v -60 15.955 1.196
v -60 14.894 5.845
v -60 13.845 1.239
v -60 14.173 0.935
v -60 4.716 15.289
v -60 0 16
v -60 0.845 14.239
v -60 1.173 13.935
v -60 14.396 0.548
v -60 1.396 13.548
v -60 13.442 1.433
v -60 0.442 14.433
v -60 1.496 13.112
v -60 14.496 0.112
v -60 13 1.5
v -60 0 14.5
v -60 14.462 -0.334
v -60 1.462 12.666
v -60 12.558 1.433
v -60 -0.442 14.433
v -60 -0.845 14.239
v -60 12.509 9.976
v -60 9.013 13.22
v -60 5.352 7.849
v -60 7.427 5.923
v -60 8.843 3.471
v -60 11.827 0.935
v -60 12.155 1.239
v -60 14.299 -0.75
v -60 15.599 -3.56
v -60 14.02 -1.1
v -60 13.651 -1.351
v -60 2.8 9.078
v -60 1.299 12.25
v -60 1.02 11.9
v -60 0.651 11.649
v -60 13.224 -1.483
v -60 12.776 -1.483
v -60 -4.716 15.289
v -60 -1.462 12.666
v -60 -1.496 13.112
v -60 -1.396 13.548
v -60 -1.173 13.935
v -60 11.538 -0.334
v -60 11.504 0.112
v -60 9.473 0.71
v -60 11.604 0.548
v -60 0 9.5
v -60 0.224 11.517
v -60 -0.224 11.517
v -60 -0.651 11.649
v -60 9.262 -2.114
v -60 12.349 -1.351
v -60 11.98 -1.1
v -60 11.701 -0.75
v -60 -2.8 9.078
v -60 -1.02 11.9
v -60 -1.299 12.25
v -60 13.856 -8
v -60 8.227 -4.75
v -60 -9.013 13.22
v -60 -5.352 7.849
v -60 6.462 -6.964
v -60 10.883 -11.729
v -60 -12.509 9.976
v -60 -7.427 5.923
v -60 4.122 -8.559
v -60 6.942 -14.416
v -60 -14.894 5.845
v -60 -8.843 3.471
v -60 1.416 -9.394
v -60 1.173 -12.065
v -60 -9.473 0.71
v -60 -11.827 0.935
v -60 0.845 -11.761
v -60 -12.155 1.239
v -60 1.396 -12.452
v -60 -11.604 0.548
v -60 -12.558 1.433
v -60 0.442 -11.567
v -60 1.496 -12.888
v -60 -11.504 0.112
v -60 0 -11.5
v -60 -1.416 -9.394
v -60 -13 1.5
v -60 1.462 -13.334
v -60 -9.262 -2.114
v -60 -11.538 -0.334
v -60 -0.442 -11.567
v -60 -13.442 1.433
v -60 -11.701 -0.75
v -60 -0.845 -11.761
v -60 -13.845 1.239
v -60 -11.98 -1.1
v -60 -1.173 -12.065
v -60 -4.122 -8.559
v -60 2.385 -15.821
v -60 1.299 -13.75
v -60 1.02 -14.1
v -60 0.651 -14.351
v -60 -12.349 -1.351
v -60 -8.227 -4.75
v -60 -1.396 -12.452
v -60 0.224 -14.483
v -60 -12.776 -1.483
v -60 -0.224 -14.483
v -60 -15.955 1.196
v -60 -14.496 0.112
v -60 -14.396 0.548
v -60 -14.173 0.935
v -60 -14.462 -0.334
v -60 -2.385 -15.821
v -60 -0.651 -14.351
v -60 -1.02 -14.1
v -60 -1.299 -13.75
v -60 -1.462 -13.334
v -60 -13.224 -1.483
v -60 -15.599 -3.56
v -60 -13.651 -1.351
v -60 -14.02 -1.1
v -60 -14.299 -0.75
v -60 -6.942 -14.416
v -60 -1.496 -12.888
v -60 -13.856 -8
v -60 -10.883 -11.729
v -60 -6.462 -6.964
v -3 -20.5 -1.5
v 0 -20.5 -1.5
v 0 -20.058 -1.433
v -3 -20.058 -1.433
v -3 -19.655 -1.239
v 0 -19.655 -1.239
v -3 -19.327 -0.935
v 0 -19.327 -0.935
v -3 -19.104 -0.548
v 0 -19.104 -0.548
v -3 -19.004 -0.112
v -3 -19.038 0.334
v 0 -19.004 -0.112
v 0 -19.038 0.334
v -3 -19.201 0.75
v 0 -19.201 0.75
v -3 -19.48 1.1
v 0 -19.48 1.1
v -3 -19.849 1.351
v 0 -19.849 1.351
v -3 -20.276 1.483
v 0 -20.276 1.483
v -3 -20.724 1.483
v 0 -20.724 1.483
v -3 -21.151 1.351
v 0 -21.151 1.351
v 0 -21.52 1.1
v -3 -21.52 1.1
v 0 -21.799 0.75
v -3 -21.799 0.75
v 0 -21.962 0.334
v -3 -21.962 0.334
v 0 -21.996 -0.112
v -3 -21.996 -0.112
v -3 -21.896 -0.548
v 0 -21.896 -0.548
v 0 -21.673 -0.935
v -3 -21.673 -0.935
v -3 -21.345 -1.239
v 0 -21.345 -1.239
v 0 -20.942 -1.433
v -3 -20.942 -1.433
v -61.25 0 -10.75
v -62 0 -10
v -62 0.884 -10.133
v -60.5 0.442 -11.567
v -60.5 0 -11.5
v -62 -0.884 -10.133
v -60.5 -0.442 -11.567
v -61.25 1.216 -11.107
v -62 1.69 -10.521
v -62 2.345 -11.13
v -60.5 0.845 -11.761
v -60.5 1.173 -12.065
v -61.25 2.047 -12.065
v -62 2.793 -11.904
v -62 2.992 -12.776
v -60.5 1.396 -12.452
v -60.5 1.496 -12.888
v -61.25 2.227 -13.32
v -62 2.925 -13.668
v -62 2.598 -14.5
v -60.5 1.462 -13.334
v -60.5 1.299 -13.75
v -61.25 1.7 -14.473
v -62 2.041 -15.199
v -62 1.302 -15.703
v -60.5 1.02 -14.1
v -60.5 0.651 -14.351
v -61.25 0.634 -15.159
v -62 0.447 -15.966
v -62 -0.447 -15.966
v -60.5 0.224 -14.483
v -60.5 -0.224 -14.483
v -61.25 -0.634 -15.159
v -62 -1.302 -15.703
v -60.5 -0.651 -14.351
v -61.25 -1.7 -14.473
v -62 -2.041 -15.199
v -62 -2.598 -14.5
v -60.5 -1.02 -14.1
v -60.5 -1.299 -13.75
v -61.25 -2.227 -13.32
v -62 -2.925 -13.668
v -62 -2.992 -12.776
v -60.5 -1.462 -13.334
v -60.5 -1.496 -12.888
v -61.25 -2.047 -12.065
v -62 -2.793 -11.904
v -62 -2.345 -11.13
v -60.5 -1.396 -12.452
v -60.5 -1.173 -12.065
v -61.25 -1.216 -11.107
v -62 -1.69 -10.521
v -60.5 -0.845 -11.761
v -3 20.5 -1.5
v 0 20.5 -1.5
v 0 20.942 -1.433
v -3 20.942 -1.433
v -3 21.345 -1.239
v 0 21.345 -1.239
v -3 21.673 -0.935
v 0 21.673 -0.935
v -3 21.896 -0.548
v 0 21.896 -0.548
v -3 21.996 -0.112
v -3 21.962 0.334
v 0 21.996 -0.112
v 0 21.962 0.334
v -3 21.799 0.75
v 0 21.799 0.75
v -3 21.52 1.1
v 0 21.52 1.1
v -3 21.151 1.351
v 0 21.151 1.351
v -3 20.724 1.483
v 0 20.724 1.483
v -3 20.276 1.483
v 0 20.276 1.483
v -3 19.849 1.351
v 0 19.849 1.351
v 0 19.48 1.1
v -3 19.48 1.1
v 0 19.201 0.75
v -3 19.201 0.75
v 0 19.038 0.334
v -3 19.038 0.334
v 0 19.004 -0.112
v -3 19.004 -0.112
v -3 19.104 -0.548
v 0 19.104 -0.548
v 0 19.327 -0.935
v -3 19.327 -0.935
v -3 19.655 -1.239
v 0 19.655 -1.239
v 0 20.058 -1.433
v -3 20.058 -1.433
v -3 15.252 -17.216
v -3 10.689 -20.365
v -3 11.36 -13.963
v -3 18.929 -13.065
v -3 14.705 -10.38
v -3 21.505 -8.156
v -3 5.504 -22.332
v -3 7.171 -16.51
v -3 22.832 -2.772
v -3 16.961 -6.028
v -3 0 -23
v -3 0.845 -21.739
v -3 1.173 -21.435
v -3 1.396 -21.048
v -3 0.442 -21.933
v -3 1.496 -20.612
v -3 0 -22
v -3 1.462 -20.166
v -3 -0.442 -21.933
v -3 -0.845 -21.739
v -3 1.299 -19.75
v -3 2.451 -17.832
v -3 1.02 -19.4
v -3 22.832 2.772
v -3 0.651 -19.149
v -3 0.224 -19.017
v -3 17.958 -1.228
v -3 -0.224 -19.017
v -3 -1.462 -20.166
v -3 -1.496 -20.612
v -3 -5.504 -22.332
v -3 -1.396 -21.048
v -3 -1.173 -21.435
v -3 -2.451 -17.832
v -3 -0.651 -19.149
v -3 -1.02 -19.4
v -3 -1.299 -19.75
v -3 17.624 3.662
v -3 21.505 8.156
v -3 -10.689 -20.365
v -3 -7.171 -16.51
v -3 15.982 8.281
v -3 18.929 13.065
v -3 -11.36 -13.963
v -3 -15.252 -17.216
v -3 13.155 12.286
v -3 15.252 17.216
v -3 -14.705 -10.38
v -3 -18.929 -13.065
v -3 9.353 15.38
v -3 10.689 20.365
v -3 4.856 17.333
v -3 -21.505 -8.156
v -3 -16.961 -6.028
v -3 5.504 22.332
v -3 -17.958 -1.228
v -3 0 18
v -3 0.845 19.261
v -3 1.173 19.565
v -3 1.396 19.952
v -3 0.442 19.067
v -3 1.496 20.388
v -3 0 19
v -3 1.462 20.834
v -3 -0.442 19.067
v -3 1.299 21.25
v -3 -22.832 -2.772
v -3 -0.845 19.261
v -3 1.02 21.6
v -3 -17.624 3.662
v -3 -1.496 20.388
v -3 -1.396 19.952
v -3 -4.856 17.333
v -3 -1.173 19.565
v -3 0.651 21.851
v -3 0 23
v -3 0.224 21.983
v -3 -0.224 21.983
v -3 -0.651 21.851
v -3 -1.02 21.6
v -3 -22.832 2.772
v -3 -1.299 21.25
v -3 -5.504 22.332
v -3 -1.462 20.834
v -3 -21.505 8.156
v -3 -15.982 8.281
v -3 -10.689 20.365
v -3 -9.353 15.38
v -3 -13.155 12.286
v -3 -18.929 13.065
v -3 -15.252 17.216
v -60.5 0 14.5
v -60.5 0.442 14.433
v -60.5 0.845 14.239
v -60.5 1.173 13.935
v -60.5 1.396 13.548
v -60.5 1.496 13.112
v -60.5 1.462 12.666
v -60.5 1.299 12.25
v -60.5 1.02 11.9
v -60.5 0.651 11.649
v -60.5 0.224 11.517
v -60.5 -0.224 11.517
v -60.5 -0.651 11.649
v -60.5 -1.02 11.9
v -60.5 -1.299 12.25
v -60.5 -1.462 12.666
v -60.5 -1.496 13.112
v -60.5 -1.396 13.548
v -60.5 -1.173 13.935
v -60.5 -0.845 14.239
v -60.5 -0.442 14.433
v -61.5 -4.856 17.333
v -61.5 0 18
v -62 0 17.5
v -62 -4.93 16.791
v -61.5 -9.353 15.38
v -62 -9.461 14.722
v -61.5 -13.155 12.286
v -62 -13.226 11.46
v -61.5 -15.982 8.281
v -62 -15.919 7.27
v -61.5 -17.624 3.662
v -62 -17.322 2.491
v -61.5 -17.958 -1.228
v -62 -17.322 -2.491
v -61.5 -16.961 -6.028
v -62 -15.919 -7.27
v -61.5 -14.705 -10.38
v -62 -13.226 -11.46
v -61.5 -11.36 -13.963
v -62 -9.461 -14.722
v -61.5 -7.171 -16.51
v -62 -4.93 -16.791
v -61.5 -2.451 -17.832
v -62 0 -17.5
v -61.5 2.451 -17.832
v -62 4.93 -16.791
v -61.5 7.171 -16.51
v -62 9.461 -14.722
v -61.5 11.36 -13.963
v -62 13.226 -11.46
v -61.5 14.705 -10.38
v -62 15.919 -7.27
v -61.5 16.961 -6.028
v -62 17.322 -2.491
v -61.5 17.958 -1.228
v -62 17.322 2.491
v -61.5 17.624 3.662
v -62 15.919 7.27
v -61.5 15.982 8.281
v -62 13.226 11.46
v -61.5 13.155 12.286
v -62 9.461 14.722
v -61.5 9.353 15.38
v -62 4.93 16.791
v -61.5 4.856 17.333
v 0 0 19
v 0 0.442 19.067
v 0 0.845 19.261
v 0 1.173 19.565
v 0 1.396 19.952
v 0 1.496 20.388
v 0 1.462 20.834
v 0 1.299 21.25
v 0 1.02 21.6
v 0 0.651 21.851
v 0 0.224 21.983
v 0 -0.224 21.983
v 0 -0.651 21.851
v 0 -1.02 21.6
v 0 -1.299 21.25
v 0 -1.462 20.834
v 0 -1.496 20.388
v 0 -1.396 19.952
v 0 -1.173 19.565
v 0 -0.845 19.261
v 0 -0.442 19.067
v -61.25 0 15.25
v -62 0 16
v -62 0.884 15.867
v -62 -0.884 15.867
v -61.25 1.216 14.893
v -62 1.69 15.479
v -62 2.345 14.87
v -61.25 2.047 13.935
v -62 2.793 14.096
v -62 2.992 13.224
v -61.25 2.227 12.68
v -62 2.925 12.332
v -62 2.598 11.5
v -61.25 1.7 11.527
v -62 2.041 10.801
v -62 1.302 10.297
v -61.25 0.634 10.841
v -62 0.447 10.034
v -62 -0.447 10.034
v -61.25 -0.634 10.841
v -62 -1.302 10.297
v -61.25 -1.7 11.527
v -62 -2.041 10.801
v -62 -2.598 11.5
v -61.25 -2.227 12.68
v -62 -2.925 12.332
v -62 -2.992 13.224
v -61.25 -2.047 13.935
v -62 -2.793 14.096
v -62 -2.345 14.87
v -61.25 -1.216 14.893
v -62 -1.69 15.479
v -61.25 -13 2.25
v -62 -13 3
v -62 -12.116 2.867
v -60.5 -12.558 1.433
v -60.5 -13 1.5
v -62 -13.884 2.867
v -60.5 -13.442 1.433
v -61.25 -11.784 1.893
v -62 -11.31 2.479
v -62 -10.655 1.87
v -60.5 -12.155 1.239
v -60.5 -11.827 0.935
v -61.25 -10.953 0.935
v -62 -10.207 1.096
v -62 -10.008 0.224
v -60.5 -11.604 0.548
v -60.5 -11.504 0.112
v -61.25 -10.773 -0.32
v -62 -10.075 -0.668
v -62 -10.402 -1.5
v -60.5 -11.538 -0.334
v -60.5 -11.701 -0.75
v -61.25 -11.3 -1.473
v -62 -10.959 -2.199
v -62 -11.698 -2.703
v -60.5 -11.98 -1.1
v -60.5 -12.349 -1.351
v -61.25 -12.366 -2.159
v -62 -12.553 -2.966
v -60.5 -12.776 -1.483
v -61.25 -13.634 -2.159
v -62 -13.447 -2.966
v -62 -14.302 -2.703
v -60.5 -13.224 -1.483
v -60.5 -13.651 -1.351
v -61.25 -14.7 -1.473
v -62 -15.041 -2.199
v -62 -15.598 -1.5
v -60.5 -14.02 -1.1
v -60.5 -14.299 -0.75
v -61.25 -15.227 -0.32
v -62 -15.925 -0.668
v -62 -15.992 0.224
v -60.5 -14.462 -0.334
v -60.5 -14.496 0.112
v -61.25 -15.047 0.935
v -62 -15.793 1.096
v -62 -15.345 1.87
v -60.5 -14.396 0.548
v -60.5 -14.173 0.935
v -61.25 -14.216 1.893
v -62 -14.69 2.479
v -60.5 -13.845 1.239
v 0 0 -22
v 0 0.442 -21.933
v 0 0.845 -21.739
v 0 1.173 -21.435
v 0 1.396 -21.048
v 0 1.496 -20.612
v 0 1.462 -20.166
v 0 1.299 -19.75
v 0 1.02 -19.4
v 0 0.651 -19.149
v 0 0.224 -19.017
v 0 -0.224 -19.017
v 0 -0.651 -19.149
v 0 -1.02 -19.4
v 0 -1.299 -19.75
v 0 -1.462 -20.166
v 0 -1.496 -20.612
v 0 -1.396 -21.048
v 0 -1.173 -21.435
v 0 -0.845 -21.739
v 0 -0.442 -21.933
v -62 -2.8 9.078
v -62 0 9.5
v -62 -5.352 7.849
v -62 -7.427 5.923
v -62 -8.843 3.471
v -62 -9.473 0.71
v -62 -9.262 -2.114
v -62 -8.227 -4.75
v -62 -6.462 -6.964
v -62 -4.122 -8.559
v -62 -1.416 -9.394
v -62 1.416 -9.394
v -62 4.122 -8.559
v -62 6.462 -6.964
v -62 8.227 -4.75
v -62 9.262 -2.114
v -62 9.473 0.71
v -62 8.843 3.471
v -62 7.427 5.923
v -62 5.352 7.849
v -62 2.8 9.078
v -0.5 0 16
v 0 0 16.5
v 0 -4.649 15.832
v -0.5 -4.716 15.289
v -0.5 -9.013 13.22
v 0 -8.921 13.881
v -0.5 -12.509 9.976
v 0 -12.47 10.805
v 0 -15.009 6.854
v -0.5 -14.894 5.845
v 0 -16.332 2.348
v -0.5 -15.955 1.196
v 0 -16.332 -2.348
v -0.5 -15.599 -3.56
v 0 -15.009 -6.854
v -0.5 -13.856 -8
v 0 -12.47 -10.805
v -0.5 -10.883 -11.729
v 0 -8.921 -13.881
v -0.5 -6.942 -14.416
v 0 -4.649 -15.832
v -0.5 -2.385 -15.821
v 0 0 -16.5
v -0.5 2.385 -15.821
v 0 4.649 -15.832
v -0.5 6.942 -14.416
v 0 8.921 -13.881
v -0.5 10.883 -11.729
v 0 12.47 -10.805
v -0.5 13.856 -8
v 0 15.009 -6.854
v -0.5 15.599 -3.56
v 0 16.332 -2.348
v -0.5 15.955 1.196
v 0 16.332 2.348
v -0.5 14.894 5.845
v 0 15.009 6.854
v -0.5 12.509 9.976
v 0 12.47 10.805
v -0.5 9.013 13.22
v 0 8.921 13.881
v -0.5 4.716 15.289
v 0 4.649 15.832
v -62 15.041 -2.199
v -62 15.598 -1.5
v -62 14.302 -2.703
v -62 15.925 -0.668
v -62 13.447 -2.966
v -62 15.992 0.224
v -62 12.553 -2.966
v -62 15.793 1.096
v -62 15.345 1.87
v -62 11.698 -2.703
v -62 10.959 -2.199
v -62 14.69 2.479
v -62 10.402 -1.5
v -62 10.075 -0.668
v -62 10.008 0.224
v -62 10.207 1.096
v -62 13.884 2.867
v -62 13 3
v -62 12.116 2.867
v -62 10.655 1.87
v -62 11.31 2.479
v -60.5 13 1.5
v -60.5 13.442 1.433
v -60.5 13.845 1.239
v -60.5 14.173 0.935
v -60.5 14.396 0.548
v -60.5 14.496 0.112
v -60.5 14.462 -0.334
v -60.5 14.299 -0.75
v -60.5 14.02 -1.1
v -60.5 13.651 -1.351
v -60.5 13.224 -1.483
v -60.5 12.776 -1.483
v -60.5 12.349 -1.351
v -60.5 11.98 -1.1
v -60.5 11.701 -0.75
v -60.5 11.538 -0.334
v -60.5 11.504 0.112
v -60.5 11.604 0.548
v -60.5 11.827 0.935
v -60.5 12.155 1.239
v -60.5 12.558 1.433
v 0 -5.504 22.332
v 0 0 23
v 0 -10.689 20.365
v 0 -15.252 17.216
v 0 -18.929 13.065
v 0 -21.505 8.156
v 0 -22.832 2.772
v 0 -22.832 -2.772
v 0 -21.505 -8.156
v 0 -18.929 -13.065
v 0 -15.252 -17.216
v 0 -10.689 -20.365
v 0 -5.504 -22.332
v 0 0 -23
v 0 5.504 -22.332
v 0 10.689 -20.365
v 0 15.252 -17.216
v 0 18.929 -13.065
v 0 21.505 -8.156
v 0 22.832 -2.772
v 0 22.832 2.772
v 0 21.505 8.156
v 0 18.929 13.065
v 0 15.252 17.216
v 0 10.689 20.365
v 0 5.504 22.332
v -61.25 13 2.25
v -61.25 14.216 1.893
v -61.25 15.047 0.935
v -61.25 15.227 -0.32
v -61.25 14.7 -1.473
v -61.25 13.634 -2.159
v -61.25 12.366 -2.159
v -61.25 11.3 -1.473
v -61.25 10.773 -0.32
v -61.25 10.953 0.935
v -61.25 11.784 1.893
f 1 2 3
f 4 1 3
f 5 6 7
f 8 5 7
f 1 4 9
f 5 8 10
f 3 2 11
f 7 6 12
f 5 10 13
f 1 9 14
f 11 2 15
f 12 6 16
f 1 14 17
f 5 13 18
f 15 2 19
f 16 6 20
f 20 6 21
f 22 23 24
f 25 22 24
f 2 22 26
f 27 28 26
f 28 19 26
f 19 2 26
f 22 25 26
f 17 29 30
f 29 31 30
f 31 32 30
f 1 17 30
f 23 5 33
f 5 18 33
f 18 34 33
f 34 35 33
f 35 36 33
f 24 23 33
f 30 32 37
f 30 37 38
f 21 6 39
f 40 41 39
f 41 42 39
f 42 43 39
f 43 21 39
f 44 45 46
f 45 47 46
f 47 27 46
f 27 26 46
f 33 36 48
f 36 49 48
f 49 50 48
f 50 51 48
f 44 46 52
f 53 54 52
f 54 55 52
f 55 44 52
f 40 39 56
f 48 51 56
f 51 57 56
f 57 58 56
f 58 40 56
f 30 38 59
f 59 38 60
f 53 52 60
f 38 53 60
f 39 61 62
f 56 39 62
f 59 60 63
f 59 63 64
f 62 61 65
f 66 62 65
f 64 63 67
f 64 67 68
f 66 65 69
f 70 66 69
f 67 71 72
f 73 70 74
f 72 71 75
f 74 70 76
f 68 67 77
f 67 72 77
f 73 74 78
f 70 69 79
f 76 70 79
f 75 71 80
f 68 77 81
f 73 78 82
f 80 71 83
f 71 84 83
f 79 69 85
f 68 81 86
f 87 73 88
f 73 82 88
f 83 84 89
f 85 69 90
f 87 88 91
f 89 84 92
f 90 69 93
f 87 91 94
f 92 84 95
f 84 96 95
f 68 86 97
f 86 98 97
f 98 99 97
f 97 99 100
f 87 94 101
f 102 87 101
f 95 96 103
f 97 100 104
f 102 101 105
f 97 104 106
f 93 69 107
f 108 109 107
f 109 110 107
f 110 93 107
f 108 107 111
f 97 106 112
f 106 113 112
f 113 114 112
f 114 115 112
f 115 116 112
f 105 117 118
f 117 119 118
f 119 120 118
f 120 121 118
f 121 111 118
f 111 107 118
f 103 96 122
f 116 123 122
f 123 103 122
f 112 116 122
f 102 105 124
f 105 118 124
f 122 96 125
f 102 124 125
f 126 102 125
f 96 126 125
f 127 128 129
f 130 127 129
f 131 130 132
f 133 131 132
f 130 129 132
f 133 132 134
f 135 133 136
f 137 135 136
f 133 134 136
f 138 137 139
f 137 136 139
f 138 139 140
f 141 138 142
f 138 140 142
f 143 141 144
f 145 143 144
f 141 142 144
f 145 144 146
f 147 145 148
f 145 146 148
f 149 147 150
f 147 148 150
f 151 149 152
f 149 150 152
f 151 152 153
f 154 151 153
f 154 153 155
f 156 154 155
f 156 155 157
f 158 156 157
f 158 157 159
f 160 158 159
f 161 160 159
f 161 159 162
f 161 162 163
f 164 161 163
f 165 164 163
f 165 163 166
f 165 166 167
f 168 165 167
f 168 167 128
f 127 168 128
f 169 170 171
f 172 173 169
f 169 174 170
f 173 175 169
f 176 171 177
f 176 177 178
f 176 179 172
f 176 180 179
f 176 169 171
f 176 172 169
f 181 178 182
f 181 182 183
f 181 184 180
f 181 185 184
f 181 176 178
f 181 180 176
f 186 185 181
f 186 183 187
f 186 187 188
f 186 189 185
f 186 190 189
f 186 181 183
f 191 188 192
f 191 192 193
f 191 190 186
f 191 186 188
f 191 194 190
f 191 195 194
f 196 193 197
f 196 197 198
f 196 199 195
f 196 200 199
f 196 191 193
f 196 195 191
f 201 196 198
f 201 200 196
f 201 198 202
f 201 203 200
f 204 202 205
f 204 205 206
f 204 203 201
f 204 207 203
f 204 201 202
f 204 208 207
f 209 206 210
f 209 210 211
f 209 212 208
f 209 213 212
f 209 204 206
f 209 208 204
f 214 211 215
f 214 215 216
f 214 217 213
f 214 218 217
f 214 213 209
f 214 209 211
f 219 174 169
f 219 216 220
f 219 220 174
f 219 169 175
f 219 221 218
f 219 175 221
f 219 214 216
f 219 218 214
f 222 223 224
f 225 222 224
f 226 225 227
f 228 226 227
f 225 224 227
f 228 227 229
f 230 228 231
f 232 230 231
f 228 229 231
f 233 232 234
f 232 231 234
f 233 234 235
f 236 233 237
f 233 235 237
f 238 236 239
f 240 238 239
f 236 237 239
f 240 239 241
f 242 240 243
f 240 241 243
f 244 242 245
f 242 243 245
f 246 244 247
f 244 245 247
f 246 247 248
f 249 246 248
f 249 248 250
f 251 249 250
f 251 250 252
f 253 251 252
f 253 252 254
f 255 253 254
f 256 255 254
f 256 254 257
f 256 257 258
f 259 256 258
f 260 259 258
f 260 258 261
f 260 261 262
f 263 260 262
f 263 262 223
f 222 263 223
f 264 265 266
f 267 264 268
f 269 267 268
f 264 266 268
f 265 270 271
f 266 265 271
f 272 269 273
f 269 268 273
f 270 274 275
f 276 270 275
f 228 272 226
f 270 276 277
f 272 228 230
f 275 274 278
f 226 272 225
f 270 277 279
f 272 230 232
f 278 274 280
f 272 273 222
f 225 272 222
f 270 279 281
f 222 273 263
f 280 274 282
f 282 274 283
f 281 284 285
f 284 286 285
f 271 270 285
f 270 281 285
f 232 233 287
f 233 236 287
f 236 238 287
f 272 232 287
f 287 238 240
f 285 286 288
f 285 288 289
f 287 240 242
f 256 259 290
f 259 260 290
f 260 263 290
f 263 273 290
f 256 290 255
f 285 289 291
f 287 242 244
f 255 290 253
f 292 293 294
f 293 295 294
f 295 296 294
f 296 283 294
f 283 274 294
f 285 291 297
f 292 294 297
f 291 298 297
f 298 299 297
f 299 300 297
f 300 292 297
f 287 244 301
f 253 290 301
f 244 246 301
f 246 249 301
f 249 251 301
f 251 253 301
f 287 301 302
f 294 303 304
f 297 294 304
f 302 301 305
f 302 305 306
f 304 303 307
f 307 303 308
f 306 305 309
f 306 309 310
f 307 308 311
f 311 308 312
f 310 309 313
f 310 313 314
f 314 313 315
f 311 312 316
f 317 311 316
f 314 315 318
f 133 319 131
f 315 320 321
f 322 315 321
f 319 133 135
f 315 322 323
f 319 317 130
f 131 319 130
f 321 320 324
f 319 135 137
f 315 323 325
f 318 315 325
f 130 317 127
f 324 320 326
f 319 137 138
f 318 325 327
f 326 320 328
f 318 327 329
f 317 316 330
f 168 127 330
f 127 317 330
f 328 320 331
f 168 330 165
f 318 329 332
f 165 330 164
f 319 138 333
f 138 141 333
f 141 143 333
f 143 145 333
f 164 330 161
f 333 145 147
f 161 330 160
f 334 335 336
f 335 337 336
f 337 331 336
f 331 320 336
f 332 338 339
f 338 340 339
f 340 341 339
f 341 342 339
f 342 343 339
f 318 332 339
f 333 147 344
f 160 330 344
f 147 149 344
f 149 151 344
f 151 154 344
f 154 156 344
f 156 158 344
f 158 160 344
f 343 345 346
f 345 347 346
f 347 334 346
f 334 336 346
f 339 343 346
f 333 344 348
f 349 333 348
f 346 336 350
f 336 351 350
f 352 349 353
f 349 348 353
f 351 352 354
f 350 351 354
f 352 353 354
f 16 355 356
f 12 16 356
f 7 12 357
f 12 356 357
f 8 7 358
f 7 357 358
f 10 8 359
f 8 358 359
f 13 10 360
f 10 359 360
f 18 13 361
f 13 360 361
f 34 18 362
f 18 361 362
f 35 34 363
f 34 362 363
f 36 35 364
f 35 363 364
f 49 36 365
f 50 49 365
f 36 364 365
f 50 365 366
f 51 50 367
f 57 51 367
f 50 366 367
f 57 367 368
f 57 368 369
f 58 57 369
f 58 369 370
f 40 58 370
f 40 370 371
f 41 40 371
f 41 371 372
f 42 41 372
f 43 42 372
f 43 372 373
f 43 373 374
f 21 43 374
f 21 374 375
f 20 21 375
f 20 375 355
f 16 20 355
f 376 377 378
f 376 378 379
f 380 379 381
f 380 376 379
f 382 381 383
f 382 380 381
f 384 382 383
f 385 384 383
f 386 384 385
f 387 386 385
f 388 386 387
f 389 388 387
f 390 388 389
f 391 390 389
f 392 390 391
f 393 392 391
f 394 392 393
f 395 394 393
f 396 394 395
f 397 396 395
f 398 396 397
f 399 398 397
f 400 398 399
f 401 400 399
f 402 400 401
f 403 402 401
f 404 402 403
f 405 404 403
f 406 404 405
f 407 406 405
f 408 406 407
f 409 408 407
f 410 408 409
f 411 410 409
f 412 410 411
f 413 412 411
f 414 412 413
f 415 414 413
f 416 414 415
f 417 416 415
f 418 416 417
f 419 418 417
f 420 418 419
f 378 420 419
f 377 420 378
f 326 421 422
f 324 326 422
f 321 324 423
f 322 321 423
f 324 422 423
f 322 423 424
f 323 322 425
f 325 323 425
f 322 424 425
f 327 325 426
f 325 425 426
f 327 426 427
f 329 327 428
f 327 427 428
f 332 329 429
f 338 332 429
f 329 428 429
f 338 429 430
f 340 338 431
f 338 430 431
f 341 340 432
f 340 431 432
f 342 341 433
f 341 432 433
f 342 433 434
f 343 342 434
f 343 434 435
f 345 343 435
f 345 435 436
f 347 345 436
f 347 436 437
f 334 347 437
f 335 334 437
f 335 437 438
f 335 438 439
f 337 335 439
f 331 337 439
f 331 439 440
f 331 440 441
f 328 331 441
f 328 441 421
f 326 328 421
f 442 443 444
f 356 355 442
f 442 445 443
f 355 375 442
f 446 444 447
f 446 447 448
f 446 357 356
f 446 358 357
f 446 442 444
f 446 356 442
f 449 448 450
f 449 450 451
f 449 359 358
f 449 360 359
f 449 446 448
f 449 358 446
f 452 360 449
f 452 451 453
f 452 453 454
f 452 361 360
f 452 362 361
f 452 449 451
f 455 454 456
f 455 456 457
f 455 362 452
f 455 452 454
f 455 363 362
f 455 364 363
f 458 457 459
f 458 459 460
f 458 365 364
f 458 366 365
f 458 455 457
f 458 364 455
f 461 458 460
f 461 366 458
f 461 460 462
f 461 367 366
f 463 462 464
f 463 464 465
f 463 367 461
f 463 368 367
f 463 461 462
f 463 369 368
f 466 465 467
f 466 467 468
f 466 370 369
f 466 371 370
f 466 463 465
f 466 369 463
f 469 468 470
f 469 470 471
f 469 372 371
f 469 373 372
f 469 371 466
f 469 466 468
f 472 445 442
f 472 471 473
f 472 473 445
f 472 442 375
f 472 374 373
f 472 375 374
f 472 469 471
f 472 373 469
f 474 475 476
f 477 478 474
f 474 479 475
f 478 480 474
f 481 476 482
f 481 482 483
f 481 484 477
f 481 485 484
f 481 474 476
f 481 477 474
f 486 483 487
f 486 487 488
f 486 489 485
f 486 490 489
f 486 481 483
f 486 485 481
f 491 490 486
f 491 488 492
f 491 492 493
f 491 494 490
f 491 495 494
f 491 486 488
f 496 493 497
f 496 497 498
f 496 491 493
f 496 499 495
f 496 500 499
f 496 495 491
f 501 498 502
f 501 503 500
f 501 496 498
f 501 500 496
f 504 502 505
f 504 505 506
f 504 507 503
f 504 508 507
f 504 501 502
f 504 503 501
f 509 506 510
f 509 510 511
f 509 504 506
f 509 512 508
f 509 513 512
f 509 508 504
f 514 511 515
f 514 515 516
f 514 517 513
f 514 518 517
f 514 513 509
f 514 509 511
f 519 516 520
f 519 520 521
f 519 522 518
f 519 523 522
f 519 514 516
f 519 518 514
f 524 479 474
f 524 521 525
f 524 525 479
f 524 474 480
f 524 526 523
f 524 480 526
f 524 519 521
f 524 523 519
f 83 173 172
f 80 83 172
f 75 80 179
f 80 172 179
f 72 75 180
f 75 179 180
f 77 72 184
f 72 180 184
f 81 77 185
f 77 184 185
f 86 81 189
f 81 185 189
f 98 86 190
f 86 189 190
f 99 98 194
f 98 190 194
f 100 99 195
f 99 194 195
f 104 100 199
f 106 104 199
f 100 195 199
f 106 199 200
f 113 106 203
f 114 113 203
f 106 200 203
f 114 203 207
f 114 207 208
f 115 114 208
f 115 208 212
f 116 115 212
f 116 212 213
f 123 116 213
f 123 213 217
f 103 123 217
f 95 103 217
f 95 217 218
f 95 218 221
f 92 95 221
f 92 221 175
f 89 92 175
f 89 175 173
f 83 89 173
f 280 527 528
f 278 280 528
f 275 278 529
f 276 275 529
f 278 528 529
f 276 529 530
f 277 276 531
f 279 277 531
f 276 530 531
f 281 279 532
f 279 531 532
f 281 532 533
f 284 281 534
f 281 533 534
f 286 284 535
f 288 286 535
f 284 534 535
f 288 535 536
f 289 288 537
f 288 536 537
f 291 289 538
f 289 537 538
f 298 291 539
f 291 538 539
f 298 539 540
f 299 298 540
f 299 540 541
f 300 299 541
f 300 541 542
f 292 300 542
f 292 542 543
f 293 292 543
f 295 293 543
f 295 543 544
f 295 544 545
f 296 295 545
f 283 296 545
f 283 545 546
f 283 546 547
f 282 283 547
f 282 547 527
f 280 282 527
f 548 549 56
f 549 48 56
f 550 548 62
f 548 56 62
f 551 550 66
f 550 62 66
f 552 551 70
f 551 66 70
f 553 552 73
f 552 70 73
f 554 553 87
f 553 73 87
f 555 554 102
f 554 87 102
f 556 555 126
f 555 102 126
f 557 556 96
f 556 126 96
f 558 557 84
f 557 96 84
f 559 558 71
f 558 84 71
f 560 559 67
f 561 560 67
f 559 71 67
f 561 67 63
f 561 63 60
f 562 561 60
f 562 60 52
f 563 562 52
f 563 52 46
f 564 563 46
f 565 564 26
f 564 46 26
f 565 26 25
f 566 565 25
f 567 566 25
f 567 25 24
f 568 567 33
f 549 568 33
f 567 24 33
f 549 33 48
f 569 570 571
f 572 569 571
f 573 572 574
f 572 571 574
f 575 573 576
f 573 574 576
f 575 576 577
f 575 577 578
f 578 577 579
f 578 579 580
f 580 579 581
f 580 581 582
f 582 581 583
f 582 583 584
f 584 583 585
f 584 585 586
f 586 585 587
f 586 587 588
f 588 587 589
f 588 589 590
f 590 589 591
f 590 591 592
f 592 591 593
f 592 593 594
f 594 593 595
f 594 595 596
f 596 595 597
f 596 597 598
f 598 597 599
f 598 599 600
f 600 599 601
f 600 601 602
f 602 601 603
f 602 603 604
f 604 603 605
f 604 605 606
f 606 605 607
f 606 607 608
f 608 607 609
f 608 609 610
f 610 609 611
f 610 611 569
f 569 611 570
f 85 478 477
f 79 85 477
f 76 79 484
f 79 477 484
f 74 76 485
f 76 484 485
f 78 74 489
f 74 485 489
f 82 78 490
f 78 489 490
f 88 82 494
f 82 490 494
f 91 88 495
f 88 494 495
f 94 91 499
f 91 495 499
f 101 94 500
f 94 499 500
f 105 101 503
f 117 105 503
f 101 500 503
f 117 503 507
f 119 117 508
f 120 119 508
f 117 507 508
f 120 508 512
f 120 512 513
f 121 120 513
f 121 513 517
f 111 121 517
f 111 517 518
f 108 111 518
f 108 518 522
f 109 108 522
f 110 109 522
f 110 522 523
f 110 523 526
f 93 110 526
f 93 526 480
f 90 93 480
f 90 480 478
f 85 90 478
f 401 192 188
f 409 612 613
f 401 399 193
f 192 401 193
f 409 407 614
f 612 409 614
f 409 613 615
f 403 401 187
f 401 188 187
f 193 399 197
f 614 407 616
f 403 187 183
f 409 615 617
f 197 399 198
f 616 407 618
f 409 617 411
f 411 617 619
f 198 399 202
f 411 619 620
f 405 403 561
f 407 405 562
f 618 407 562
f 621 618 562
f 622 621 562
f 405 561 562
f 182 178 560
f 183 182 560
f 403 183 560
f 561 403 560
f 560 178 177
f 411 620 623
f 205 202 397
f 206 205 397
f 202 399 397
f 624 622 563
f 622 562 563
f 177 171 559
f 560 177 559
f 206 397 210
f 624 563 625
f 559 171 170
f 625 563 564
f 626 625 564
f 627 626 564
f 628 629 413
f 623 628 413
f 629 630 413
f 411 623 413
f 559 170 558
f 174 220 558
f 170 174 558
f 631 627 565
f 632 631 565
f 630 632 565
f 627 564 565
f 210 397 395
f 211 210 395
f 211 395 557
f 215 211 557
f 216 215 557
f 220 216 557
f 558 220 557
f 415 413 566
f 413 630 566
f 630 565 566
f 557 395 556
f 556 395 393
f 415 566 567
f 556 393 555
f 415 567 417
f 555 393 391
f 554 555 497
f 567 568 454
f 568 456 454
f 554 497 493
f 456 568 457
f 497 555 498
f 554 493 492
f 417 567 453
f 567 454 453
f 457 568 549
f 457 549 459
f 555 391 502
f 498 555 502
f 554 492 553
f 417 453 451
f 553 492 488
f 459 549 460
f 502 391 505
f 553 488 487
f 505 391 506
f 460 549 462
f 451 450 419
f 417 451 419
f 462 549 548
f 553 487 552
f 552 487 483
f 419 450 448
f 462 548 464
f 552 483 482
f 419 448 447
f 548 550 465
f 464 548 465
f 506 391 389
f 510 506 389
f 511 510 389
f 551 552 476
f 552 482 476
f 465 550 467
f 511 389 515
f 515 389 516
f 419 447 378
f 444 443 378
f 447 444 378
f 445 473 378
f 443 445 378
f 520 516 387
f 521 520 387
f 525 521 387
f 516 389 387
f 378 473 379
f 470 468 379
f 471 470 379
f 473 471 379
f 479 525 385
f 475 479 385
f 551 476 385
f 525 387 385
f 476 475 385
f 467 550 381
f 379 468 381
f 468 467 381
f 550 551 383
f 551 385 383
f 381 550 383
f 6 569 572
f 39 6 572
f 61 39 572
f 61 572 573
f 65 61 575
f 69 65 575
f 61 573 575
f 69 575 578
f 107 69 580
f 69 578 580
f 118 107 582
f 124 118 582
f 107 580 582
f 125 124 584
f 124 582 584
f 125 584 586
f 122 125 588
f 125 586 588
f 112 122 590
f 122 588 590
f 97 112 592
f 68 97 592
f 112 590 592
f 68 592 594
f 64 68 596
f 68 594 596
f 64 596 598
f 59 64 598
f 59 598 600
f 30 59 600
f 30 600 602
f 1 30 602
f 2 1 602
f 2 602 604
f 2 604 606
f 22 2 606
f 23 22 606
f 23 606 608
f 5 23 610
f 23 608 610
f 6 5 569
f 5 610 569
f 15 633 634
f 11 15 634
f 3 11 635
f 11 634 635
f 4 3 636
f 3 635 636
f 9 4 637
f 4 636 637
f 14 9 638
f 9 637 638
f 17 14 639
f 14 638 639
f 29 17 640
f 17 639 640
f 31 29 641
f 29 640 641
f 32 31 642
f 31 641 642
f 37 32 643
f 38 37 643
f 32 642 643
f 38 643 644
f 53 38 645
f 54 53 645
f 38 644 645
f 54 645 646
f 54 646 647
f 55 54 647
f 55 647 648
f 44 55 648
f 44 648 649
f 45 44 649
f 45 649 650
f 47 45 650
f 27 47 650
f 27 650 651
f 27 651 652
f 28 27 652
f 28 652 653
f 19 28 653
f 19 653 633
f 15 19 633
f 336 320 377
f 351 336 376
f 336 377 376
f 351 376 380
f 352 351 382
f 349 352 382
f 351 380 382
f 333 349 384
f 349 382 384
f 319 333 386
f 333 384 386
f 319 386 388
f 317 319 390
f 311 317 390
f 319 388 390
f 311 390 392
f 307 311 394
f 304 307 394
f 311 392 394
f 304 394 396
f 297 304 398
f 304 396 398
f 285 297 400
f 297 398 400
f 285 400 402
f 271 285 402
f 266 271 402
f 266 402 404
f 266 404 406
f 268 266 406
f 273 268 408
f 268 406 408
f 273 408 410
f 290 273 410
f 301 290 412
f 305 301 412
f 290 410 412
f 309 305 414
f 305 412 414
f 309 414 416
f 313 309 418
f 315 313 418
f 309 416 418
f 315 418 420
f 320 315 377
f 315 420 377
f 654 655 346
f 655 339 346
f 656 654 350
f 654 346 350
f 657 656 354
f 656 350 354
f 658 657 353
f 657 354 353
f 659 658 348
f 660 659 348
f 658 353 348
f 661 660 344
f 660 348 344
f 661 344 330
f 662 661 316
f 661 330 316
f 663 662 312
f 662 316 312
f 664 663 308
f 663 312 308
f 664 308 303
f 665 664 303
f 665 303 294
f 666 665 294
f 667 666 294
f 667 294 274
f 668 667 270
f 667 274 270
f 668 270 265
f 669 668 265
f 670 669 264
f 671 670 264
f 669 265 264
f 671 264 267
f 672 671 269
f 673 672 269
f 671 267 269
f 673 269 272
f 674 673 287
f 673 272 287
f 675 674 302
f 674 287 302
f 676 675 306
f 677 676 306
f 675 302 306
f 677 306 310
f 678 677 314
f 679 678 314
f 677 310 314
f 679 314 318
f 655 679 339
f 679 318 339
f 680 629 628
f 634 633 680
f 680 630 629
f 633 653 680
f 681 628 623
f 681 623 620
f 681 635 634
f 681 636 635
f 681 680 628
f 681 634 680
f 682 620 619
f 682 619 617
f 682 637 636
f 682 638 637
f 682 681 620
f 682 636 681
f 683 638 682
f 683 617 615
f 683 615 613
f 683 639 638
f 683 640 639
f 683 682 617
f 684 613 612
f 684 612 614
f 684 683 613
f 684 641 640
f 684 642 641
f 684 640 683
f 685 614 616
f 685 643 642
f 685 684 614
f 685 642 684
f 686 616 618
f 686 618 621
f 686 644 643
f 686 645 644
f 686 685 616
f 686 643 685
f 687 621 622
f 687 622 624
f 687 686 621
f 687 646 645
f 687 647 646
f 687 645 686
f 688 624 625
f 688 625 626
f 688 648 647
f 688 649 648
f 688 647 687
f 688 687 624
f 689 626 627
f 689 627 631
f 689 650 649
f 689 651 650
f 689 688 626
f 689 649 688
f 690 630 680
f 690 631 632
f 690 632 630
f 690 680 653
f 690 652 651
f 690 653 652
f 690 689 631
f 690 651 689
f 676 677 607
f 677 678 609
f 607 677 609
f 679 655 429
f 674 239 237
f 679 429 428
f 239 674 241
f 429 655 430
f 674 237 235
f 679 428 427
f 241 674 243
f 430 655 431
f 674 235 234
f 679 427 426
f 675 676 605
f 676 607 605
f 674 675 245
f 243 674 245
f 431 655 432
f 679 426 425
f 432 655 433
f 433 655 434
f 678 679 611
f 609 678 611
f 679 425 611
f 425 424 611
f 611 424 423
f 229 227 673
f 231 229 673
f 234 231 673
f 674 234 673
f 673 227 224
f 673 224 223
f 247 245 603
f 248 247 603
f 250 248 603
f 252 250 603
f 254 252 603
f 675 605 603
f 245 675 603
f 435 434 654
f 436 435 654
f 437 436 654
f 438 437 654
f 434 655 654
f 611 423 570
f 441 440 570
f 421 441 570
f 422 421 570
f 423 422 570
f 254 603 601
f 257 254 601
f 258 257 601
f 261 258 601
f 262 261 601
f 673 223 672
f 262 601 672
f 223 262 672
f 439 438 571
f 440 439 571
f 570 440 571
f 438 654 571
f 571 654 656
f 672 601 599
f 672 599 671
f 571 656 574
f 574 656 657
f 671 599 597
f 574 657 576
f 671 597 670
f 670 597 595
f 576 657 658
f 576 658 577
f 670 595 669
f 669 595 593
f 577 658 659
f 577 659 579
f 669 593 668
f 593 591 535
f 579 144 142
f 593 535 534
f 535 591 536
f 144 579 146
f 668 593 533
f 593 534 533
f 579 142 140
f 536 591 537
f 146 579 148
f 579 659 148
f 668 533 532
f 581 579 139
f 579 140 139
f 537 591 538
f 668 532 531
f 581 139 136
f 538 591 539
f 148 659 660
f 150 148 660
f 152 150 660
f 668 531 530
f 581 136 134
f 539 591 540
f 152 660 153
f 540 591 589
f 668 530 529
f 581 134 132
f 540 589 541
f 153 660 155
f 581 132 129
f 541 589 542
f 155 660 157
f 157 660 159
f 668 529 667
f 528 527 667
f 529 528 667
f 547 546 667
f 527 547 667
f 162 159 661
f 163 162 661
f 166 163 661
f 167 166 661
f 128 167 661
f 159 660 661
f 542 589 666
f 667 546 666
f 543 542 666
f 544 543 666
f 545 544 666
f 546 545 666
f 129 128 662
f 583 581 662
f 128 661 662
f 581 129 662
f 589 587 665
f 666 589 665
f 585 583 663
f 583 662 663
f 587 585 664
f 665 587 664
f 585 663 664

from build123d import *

# Parameters (mm, degrees)
CUT_EXTRUDE_1_REACH = 72.014
SKETCH_2_R          = 1.5
CHAMFER_1_SIZE      = 1.5
CUT_EXTRUDE_2_REACH = 72.014
SKETCH_3_R          = 1.5
CHAMFER_2_SIZE      = 0.5


with BuildPart() as part:
    # 草图1 → 旋转1 (revolve)
    with BuildSketch(Plane.XY, mode=Mode.PRIVATE) as revolve_1_sk:
        Polygon((-62, 18), (-62, 9.5), (-60, 9.5), (-60, 16), (0, 16), (0, 23), (-3, 23), (-3, 18), align=None)
    revolve(revolve_1_sk.sketch.rotate(Axis((-69.956231489, 0, 0), (1, 0, 0)), 90), axis=Axis((-69.956231489, 0, 0), (1, 0, 0)))

    # 草图2 → 切除-拉伸1 (cut, up to next)
    with BuildSketch(Plane.ZY.offset(62), mode=Mode.PRIVATE) as cut_extrude_1_sk1:
        with Locations((0, 13)):
            Circle(SKETCH_2_R)
    cut_extrude_1_tool1 = extrude(cut_extrude_1_sk1.sketch, amount=-CUT_EXTRUDE_1_REACH, mode=Mode.PRIVATE) & part.part
    # 草图2 → 切除-拉伸1 (cut, up to next)
    with BuildSketch(Plane.ZY.offset(62), mode=Mode.PRIVATE) as cut_extrude_1_sk2:
        with Locations((13, 0)):
            Circle(SKETCH_2_R)
    cut_extrude_1_tool2 = extrude(cut_extrude_1_sk2.sketch, amount=-CUT_EXTRUDE_1_REACH, mode=Mode.PRIVATE) & part.part
    # 草图2 → 切除-拉伸1 (cut, up to next)
    with BuildSketch(Plane.ZY.offset(62), mode=Mode.PRIVATE) as cut_extrude_1_sk3:
        with Locations((0, -13)):
            Circle(SKETCH_2_R)
    cut_extrude_1_tool3 = extrude(cut_extrude_1_sk3.sketch, amount=-CUT_EXTRUDE_1_REACH, mode=Mode.PRIVATE) & part.part
    # 草图2 → 切除-拉伸1 (cut, up to next)
    with BuildSketch(Plane.ZY.offset(62), mode=Mode.PRIVATE) as cut_extrude_1_sk4:
        with Locations((-13, 0)):
            Circle(SKETCH_2_R)
    cut_extrude_1_tool4 = extrude(cut_extrude_1_sk4.sketch, amount=-CUT_EXTRUDE_1_REACH, mode=Mode.PRIVATE) & part.part
    add(cut_extrude_1_tool1.solids().sort_by_distance((-62, 13, 0))[0], mode=Mode.SUBTRACT)
    add(cut_extrude_1_tool2.solids().sort_by_distance((-62, 0, 13))[0], mode=Mode.SUBTRACT)
    add(cut_extrude_1_tool3.solids().sort_by_distance((-62, -13, 0))[0], mode=Mode.SUBTRACT)
    add(cut_extrude_1_tool4.solids().sort_by_distance((-62, 0, -13))[0], mode=Mode.SUBTRACT)

    # 倒角1
    chamfer_1_edges = [part.edges().sort_by_distance(p)[0] for p in [
        (-62, 13, -1.5),
        (-62, 0, 11.5),
        (-62, -13, -1.5),
        (-62, 0, -14.5),
    ]]
    chamfer(chamfer_1_edges, length=CHAMFER_1_SIZE)

    # 草图3 → 切除-拉伸2 (cut, up to next)
    with BuildSketch(Plane(origin=(0, 0, 0), x_dir=(0, 0, -1), z_dir=(1, 0, 0)), mode=Mode.PRIVATE) as cut_extrude_2_sk1:
        with Locations((0, 20.5)):
            Circle(SKETCH_3_R)
    cut_extrude_2_tool1 = extrude(cut_extrude_2_sk1.sketch, amount=-CUT_EXTRUDE_2_REACH, mode=Mode.PRIVATE) & part.part
    # 草图3 → 切除-拉伸2 (cut, up to next)
    with BuildSketch(Plane(origin=(0, 0, 0), x_dir=(0, 0, -1), z_dir=(1, 0, 0)), mode=Mode.PRIVATE) as cut_extrude_2_sk2:
        with Locations((20.5, 0)):
            Circle(SKETCH_3_R)
    cut_extrude_2_tool2 = extrude(cut_extrude_2_sk2.sketch, amount=-CUT_EXTRUDE_2_REACH, mode=Mode.PRIVATE) & part.part
    # 草图3 → 切除-拉伸2 (cut, up to next)
    with BuildSketch(Plane(origin=(0, 0, 0), x_dir=(0, 0, -1), z_dir=(1, 0, 0)), mode=Mode.PRIVATE) as cut_extrude_2_sk3:
        with Locations((0, -20.5)):
            Circle(SKETCH_3_R)
    cut_extrude_2_tool3 = extrude(cut_extrude_2_sk3.sketch, amount=-CUT_EXTRUDE_2_REACH, mode=Mode.PRIVATE) & part.part
    # 草图3 → 切除-拉伸2 (cut, up to next)
    with BuildSketch(Plane(origin=(0, 0, 0), x_dir=(0, 0, -1), z_dir=(1, 0, 0)), mode=Mode.PRIVATE) as cut_extrude_2_sk4:
        with Locations((-20.5, 0)):
            Circle(SKETCH_3_R)
    cut_extrude_2_tool4 = extrude(cut_extrude_2_sk4.sketch, amount=-CUT_EXTRUDE_2_REACH, mode=Mode.PRIVATE) & part.part
    add(cut_extrude_2_tool1.solids().sort_by_distance((0, 20.5, 0))[0], mode=Mode.SUBTRACT)
    add(cut_extrude_2_tool2.solids().sort_by_distance((0, 0, -20.5))[0], mode=Mode.SUBTRACT)
    add(cut_extrude_2_tool3.solids().sort_by_distance((0, -20.5, 0))[0], mode=Mode.SUBTRACT)
    add(cut_extrude_2_tool4.solids().sort_by_distance((0, 0, 20.5))[0], mode=Mode.SUBTRACT)

    # 倒角2
    chamfer_2_edges = [part.edges().sort_by_distance(p)[0] for p in [
        (0, 0, -16),
        (-62, 0, -18),
    ]]
    chamfer(chamfer_2_edges, length=CHAMFER_2_SIZE)


solid = part.part
